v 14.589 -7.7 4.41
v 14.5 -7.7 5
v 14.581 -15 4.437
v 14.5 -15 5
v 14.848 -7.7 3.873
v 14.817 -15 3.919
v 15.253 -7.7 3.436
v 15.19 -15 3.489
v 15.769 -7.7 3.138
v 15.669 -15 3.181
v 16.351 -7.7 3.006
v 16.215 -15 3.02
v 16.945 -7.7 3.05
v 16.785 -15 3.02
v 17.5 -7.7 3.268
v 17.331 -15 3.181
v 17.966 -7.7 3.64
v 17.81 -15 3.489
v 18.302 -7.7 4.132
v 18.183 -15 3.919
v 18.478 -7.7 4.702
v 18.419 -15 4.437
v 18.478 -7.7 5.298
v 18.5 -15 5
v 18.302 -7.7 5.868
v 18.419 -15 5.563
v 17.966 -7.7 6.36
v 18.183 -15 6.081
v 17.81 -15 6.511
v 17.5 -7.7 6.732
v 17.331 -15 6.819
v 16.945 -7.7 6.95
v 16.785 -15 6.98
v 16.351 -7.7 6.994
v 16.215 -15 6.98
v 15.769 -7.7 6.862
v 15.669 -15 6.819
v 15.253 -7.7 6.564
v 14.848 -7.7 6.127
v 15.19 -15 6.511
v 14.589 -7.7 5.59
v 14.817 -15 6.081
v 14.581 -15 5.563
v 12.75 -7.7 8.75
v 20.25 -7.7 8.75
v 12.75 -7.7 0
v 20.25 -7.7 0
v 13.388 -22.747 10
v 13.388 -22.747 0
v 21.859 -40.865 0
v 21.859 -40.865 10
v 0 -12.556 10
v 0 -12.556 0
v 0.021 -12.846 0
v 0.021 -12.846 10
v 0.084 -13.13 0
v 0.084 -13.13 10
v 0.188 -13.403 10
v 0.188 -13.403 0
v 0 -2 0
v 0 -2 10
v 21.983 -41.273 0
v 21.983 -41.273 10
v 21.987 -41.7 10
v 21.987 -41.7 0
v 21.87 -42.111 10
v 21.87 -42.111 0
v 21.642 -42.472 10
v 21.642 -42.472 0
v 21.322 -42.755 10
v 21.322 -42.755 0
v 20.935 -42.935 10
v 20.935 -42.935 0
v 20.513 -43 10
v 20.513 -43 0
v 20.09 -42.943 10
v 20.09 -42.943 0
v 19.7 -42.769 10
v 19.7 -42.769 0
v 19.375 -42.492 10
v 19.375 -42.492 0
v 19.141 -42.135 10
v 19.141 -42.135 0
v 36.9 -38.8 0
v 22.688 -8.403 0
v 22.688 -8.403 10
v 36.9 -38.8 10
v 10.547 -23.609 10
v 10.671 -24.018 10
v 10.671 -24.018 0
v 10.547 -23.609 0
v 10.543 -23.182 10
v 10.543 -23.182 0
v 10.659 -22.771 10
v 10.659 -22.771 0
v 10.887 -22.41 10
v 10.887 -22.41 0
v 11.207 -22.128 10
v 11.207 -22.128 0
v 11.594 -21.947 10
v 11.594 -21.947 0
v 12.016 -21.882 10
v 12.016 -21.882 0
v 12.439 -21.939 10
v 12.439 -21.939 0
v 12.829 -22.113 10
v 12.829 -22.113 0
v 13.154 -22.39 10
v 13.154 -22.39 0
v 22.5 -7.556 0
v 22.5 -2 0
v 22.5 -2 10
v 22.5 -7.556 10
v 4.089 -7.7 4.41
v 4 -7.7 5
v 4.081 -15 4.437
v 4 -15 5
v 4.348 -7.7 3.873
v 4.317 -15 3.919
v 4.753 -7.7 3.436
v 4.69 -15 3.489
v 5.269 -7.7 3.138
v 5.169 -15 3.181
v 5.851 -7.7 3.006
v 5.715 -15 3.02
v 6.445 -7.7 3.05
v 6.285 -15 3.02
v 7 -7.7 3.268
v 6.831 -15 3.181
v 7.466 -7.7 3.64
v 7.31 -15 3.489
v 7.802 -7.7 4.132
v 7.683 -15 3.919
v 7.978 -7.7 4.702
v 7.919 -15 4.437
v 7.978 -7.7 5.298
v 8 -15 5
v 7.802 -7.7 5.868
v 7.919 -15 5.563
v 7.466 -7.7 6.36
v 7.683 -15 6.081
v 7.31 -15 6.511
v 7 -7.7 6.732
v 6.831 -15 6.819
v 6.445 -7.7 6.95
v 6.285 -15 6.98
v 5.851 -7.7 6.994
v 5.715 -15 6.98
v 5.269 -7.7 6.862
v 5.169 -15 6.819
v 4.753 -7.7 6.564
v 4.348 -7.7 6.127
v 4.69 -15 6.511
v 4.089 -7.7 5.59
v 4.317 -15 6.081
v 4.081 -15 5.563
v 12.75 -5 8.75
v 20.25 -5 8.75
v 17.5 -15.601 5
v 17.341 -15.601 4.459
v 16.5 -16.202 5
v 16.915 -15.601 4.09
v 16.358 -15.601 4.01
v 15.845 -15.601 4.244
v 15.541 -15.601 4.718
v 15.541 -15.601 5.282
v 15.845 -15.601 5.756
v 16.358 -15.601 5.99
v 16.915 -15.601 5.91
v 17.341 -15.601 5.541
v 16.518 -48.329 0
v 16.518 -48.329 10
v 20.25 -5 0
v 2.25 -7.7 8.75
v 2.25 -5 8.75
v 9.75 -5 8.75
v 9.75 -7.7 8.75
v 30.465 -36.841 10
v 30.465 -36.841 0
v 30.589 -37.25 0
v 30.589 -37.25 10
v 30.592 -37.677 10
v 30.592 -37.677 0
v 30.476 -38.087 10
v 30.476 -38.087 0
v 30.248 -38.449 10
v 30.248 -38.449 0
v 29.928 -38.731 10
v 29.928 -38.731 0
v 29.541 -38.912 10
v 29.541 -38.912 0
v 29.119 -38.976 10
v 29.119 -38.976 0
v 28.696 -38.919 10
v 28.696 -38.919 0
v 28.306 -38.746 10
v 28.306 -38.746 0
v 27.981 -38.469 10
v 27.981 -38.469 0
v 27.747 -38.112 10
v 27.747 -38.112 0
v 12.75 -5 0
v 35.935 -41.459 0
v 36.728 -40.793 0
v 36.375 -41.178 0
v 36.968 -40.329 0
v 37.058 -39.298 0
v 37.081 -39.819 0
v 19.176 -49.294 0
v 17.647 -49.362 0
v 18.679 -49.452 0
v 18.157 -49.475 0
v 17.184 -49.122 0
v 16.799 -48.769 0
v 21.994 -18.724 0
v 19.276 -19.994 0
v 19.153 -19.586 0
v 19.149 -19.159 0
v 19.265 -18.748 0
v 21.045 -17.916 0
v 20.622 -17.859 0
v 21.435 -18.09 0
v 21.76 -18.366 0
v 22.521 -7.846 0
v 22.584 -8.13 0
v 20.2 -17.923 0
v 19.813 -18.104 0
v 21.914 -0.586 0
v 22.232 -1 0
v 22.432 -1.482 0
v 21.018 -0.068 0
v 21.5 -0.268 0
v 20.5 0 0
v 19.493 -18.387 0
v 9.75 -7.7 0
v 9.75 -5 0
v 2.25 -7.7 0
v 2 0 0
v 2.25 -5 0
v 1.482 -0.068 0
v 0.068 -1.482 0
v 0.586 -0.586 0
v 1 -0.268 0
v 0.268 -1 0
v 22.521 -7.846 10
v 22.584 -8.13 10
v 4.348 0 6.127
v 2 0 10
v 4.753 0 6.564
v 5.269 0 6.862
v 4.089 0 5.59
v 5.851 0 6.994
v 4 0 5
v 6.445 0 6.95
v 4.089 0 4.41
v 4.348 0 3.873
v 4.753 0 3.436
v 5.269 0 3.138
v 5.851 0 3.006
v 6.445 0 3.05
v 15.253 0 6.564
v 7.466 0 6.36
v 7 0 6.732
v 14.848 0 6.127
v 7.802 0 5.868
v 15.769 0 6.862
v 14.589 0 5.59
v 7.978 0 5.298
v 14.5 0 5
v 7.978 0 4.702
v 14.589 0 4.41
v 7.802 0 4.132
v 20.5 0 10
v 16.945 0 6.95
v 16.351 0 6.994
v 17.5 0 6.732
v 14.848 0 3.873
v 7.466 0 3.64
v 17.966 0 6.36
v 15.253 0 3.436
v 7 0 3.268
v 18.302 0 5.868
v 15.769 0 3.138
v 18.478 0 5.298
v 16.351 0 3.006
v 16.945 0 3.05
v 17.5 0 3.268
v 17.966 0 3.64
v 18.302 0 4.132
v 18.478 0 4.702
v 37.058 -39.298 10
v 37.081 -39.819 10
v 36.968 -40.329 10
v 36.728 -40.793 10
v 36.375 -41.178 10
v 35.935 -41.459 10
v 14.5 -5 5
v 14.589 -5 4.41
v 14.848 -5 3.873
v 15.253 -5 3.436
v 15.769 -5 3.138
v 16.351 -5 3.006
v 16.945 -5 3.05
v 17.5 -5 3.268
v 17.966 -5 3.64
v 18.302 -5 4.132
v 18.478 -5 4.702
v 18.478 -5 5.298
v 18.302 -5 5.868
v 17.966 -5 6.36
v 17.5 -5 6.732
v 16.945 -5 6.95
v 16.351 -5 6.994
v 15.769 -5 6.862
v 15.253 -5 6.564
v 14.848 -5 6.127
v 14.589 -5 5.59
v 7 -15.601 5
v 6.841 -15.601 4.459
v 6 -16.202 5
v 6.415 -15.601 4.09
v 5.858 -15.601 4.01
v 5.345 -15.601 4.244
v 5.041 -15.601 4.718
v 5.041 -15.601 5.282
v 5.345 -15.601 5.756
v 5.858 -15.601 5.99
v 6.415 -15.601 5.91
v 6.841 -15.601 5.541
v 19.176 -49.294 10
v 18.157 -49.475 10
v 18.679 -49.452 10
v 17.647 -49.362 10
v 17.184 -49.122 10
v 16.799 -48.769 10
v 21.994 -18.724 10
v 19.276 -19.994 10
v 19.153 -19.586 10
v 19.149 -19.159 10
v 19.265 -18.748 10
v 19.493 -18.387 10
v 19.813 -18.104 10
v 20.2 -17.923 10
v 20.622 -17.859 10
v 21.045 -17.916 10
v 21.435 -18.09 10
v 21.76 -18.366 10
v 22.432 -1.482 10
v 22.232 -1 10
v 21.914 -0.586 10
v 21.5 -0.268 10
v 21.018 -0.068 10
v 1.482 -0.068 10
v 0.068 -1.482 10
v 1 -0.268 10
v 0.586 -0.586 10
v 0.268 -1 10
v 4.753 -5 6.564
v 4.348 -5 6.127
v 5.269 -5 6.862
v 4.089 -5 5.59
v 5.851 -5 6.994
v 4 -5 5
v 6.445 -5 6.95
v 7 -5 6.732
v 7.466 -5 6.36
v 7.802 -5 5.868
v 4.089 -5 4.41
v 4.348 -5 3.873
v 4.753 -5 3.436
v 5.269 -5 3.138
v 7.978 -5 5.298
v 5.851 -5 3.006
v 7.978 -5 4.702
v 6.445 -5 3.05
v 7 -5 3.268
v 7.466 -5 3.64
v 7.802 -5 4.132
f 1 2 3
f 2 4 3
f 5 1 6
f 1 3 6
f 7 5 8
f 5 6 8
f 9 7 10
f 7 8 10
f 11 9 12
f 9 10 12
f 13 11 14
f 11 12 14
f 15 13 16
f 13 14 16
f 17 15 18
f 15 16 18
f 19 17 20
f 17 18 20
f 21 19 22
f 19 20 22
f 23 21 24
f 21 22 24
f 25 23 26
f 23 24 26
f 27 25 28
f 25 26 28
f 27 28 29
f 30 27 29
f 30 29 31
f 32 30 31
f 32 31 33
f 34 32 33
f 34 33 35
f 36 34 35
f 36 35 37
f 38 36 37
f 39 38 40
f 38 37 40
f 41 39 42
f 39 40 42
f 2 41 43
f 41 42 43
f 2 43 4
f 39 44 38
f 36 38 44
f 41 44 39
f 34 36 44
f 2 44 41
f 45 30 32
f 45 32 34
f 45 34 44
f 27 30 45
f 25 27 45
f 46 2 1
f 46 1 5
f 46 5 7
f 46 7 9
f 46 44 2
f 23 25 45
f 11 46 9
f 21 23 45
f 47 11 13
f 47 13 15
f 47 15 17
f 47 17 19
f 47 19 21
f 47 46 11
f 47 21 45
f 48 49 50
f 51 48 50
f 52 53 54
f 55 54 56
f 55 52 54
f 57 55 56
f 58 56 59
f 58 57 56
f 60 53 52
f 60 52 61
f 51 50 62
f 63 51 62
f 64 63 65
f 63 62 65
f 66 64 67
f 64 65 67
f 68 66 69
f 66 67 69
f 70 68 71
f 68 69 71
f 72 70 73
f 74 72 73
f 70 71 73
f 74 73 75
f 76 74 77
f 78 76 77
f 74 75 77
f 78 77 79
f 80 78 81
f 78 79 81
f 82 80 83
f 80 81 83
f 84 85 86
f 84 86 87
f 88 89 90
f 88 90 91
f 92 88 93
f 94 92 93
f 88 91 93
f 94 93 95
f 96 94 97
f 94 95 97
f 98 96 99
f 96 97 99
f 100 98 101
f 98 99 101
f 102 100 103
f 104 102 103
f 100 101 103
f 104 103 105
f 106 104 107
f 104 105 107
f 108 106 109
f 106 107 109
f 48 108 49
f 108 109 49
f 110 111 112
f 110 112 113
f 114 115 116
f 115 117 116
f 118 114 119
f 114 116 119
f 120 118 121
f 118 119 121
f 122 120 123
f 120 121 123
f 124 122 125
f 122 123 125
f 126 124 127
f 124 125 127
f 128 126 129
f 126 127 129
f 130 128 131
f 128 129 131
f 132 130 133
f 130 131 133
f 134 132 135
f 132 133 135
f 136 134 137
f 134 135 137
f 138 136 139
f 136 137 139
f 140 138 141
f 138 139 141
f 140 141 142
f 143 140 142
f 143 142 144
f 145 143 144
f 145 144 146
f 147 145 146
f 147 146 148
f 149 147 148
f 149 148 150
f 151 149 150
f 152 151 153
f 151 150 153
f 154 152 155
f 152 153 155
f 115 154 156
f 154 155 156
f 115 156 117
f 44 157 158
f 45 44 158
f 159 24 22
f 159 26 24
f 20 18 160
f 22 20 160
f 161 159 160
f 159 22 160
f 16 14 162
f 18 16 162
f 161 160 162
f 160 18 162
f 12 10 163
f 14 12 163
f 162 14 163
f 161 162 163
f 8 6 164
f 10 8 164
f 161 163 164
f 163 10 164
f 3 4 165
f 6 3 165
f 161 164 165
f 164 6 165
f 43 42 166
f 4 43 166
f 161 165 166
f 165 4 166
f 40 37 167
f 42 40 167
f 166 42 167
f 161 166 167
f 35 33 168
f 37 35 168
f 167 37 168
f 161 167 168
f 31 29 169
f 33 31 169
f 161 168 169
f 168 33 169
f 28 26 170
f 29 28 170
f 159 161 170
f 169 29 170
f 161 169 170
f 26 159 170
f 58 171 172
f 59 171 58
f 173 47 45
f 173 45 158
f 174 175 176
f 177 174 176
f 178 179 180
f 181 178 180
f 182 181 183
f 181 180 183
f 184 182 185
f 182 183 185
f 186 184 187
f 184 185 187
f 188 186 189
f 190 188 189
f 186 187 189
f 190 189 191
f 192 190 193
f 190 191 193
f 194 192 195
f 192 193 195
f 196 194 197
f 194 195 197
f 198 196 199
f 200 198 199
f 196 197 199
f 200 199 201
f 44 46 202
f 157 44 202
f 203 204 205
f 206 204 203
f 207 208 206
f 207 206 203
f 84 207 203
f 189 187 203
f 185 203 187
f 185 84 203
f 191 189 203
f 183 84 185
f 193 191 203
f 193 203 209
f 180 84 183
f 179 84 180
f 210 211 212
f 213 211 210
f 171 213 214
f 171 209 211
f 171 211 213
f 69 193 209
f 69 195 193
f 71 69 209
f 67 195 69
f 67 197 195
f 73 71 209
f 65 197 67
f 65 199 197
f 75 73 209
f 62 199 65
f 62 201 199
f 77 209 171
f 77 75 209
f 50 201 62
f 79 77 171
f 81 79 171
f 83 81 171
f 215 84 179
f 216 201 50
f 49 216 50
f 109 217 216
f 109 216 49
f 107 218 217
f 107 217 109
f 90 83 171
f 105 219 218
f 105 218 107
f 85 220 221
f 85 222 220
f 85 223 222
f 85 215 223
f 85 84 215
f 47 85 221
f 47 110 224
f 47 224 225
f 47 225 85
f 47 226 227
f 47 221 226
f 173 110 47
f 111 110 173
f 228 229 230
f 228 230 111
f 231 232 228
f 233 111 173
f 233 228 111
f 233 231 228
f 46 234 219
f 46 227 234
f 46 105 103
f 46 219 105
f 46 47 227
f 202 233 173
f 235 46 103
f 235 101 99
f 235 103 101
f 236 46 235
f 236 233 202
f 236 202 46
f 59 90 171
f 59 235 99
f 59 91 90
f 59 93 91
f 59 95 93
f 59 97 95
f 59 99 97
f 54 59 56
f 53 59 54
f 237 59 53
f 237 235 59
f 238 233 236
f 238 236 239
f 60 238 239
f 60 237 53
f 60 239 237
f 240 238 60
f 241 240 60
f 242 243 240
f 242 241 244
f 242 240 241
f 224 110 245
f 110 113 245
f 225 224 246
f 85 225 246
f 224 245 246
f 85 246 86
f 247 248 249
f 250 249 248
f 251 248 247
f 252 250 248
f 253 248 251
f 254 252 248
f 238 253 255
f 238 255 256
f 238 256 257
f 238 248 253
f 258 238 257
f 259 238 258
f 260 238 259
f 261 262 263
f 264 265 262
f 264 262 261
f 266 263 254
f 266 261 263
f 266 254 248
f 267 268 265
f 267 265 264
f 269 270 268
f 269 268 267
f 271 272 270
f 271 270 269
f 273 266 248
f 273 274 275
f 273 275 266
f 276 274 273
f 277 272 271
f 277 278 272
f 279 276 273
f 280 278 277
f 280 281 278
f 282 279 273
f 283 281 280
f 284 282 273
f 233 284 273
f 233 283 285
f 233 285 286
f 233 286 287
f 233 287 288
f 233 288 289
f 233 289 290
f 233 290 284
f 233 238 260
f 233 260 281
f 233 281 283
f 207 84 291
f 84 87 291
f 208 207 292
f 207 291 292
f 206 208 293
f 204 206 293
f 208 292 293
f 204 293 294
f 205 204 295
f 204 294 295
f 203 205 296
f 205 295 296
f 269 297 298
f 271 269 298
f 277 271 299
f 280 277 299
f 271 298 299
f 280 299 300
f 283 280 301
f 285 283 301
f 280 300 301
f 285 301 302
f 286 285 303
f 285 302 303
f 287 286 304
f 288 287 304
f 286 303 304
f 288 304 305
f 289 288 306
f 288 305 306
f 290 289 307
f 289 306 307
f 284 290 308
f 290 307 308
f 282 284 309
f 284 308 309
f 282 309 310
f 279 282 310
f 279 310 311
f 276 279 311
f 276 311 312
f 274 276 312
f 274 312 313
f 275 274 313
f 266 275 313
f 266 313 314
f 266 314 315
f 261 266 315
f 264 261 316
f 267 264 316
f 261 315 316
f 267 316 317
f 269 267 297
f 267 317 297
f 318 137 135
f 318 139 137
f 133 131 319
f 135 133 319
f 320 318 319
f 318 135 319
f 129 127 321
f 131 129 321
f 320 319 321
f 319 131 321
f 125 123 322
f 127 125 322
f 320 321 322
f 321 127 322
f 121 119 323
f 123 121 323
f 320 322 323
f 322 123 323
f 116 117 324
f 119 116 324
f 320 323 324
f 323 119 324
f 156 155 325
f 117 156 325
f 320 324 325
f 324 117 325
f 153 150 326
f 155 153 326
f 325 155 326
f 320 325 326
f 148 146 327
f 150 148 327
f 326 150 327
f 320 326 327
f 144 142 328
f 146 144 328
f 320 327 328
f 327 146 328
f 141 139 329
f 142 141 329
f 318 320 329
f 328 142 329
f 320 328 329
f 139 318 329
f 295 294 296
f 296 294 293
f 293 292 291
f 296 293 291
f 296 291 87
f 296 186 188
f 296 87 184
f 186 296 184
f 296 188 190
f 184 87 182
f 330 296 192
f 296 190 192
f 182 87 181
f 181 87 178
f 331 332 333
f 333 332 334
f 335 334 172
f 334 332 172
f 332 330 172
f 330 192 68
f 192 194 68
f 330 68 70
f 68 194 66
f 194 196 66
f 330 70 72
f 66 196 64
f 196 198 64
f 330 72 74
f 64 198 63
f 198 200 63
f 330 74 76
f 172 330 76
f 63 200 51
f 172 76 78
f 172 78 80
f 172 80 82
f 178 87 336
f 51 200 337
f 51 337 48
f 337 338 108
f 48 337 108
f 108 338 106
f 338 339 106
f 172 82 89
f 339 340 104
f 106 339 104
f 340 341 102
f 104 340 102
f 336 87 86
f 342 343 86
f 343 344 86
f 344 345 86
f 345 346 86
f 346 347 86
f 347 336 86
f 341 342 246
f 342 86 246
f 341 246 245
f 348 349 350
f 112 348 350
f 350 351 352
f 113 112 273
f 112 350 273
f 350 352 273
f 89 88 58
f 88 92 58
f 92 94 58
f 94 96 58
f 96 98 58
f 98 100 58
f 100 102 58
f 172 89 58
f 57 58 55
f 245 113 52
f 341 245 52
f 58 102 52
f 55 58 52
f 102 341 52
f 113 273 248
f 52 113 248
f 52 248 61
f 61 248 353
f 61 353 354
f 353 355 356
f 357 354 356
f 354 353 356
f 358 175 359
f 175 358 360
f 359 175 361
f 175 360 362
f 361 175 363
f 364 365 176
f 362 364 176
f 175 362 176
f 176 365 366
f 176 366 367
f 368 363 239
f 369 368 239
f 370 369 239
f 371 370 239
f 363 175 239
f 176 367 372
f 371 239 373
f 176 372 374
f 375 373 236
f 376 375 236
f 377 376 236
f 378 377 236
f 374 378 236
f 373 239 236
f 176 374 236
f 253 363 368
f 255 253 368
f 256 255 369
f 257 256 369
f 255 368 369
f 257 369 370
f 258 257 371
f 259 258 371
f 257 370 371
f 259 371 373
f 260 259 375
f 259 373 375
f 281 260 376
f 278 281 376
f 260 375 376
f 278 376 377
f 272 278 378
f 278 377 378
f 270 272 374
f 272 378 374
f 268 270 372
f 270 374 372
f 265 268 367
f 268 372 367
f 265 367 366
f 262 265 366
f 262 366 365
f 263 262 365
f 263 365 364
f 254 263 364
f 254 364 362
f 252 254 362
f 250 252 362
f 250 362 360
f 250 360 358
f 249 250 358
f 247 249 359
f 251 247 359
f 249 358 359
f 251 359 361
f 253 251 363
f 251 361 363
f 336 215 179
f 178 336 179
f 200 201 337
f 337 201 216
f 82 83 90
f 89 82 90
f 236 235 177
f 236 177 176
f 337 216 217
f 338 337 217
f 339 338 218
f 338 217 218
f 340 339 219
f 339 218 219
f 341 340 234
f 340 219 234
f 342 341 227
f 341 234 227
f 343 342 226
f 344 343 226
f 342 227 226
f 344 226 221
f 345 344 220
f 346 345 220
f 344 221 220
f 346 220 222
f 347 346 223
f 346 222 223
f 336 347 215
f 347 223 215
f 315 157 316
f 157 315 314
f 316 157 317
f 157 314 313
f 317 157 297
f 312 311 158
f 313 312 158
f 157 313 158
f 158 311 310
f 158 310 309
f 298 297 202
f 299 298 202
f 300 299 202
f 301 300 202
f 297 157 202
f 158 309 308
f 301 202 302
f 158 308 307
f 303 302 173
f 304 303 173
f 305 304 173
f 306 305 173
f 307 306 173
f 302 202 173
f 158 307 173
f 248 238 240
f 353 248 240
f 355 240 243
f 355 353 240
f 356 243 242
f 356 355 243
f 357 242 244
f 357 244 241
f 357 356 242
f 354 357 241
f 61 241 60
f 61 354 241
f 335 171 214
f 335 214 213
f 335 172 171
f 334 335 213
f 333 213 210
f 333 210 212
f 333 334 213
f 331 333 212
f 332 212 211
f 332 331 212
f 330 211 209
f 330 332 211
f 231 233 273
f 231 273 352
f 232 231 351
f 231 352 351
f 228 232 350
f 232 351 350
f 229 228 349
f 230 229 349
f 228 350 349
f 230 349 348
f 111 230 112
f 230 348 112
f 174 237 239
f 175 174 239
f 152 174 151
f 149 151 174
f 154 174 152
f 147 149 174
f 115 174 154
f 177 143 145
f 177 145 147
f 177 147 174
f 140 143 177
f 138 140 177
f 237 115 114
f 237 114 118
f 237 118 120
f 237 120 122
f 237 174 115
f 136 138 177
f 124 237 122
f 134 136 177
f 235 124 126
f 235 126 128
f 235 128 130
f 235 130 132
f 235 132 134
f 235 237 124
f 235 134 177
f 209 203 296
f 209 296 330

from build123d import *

# Parameters (mm, degrees)
BOSS_EXTRUDE1_DEPTH          = 10
F_4_0_4_DIAMETER_HOLE1_D     = 4
F_4_0_4_DIAMETER_HOLE1_DEPTH = 15
F_4_0_4_DIAMETER_HOLE1_TIP   = 1.201721238
SKETCH6_W                    = 7.5
SKETCH6_H                    = 2.7
CUT_EXTRUDE1_DEPTH           = 8.75
FILLET1_R                    = 2


with BuildPart() as part:
    # Sketch1 → Boss-Extrude1 (new body)
    with BuildSketch(Plane.XY):
        Polygon((0, 0), (22.5, 0), (22.5, -8), (37.747058824, -40.611764706), (17.364705882, -50.141176471), (0, -13), align=None)
        with BuildLine():
            Line((13.388235294, -22.747058824), (21.858823529, -40.864705882))
            ThreePointArc((21.858823529, -40.864705882), (21.135294118, -42.858823529), (19.141176471, -42.135294118))
            Line((19.141176471, -42.135294118), (10.670588235, -24.017647059))
            ThreePointArc((10.670588235, -24.017647059), (11.394117647, -22.023529412), (13.388235294, -22.747058824))
        make_face(mode=Mode.SUBTRACT)
        with BuildLine():
            Line((21.994117647, -18.723529412), (30.464705882, -36.841176471))
            ThreePointArc((30.464705882, -36.841176471), (29.741176471, -38.835294118), (27.747058824, -38.111764706))
            Line((27.747058824, -38.111764706), (19.276470588, -19.994117647))
            ThreePointArc((19.276470588, -19.994117647), (20, -18), (21.994117647, -18.723529412))
        make_face(mode=Mode.SUBTRACT)
    extrude(amount=BOSS_EXTRUDE1_DEPTH)

    # Ø4.0 (4) Diameter Hole1
    with Locations(Plane(origin=(0, 0, 0), x_dir=(1, 0, 0), z_dir=(0, 1, 0))):
        with Locations((6, -5), (16.5, -5)):
            Hole(F_4_0_4_DIAMETER_HOLE1_D / 2, depth=F_4_0_4_DIAMETER_HOLE1_DEPTH)
            with Locations((0, 0, -(F_4_0_4_DIAMETER_HOLE1_DEPTH + F_4_0_4_DIAMETER_HOLE1_TIP / 2))):  # 118° drill point
                Cone(0, F_4_0_4_DIAMETER_HOLE1_D / 2, F_4_0_4_DIAMETER_HOLE1_TIP, mode=Mode.SUBTRACT)

    # Sketch6 → Cut-Extrude1 (cut)
    with BuildSketch(Plane.XY):
        with Locations((6, -6.35)):
            Rectangle(SKETCH6_W, SKETCH6_H)
        with Locations((16.5, -6.35)):
            Rectangle(SKETCH6_W, SKETCH6_H)
    extrude(amount=CUT_EXTRUDE1_DEPTH, mode=Mode.SUBTRACT)

    # Fillet1
    fillet1_edges = [part.edges().sort_by_distance(p)[0] for p in [
        (0, 0, 5),
        (22.5, 0, 5),
        (22.5, -8, 5),
        (37.747058824, -40.611764706, 5),
        (17.364705882, -50.141176471, 5),
        (0, -13, 5),
    ]]
    fillet(fillet1_edges, radius=FILLET1_R)


solid = part.part
